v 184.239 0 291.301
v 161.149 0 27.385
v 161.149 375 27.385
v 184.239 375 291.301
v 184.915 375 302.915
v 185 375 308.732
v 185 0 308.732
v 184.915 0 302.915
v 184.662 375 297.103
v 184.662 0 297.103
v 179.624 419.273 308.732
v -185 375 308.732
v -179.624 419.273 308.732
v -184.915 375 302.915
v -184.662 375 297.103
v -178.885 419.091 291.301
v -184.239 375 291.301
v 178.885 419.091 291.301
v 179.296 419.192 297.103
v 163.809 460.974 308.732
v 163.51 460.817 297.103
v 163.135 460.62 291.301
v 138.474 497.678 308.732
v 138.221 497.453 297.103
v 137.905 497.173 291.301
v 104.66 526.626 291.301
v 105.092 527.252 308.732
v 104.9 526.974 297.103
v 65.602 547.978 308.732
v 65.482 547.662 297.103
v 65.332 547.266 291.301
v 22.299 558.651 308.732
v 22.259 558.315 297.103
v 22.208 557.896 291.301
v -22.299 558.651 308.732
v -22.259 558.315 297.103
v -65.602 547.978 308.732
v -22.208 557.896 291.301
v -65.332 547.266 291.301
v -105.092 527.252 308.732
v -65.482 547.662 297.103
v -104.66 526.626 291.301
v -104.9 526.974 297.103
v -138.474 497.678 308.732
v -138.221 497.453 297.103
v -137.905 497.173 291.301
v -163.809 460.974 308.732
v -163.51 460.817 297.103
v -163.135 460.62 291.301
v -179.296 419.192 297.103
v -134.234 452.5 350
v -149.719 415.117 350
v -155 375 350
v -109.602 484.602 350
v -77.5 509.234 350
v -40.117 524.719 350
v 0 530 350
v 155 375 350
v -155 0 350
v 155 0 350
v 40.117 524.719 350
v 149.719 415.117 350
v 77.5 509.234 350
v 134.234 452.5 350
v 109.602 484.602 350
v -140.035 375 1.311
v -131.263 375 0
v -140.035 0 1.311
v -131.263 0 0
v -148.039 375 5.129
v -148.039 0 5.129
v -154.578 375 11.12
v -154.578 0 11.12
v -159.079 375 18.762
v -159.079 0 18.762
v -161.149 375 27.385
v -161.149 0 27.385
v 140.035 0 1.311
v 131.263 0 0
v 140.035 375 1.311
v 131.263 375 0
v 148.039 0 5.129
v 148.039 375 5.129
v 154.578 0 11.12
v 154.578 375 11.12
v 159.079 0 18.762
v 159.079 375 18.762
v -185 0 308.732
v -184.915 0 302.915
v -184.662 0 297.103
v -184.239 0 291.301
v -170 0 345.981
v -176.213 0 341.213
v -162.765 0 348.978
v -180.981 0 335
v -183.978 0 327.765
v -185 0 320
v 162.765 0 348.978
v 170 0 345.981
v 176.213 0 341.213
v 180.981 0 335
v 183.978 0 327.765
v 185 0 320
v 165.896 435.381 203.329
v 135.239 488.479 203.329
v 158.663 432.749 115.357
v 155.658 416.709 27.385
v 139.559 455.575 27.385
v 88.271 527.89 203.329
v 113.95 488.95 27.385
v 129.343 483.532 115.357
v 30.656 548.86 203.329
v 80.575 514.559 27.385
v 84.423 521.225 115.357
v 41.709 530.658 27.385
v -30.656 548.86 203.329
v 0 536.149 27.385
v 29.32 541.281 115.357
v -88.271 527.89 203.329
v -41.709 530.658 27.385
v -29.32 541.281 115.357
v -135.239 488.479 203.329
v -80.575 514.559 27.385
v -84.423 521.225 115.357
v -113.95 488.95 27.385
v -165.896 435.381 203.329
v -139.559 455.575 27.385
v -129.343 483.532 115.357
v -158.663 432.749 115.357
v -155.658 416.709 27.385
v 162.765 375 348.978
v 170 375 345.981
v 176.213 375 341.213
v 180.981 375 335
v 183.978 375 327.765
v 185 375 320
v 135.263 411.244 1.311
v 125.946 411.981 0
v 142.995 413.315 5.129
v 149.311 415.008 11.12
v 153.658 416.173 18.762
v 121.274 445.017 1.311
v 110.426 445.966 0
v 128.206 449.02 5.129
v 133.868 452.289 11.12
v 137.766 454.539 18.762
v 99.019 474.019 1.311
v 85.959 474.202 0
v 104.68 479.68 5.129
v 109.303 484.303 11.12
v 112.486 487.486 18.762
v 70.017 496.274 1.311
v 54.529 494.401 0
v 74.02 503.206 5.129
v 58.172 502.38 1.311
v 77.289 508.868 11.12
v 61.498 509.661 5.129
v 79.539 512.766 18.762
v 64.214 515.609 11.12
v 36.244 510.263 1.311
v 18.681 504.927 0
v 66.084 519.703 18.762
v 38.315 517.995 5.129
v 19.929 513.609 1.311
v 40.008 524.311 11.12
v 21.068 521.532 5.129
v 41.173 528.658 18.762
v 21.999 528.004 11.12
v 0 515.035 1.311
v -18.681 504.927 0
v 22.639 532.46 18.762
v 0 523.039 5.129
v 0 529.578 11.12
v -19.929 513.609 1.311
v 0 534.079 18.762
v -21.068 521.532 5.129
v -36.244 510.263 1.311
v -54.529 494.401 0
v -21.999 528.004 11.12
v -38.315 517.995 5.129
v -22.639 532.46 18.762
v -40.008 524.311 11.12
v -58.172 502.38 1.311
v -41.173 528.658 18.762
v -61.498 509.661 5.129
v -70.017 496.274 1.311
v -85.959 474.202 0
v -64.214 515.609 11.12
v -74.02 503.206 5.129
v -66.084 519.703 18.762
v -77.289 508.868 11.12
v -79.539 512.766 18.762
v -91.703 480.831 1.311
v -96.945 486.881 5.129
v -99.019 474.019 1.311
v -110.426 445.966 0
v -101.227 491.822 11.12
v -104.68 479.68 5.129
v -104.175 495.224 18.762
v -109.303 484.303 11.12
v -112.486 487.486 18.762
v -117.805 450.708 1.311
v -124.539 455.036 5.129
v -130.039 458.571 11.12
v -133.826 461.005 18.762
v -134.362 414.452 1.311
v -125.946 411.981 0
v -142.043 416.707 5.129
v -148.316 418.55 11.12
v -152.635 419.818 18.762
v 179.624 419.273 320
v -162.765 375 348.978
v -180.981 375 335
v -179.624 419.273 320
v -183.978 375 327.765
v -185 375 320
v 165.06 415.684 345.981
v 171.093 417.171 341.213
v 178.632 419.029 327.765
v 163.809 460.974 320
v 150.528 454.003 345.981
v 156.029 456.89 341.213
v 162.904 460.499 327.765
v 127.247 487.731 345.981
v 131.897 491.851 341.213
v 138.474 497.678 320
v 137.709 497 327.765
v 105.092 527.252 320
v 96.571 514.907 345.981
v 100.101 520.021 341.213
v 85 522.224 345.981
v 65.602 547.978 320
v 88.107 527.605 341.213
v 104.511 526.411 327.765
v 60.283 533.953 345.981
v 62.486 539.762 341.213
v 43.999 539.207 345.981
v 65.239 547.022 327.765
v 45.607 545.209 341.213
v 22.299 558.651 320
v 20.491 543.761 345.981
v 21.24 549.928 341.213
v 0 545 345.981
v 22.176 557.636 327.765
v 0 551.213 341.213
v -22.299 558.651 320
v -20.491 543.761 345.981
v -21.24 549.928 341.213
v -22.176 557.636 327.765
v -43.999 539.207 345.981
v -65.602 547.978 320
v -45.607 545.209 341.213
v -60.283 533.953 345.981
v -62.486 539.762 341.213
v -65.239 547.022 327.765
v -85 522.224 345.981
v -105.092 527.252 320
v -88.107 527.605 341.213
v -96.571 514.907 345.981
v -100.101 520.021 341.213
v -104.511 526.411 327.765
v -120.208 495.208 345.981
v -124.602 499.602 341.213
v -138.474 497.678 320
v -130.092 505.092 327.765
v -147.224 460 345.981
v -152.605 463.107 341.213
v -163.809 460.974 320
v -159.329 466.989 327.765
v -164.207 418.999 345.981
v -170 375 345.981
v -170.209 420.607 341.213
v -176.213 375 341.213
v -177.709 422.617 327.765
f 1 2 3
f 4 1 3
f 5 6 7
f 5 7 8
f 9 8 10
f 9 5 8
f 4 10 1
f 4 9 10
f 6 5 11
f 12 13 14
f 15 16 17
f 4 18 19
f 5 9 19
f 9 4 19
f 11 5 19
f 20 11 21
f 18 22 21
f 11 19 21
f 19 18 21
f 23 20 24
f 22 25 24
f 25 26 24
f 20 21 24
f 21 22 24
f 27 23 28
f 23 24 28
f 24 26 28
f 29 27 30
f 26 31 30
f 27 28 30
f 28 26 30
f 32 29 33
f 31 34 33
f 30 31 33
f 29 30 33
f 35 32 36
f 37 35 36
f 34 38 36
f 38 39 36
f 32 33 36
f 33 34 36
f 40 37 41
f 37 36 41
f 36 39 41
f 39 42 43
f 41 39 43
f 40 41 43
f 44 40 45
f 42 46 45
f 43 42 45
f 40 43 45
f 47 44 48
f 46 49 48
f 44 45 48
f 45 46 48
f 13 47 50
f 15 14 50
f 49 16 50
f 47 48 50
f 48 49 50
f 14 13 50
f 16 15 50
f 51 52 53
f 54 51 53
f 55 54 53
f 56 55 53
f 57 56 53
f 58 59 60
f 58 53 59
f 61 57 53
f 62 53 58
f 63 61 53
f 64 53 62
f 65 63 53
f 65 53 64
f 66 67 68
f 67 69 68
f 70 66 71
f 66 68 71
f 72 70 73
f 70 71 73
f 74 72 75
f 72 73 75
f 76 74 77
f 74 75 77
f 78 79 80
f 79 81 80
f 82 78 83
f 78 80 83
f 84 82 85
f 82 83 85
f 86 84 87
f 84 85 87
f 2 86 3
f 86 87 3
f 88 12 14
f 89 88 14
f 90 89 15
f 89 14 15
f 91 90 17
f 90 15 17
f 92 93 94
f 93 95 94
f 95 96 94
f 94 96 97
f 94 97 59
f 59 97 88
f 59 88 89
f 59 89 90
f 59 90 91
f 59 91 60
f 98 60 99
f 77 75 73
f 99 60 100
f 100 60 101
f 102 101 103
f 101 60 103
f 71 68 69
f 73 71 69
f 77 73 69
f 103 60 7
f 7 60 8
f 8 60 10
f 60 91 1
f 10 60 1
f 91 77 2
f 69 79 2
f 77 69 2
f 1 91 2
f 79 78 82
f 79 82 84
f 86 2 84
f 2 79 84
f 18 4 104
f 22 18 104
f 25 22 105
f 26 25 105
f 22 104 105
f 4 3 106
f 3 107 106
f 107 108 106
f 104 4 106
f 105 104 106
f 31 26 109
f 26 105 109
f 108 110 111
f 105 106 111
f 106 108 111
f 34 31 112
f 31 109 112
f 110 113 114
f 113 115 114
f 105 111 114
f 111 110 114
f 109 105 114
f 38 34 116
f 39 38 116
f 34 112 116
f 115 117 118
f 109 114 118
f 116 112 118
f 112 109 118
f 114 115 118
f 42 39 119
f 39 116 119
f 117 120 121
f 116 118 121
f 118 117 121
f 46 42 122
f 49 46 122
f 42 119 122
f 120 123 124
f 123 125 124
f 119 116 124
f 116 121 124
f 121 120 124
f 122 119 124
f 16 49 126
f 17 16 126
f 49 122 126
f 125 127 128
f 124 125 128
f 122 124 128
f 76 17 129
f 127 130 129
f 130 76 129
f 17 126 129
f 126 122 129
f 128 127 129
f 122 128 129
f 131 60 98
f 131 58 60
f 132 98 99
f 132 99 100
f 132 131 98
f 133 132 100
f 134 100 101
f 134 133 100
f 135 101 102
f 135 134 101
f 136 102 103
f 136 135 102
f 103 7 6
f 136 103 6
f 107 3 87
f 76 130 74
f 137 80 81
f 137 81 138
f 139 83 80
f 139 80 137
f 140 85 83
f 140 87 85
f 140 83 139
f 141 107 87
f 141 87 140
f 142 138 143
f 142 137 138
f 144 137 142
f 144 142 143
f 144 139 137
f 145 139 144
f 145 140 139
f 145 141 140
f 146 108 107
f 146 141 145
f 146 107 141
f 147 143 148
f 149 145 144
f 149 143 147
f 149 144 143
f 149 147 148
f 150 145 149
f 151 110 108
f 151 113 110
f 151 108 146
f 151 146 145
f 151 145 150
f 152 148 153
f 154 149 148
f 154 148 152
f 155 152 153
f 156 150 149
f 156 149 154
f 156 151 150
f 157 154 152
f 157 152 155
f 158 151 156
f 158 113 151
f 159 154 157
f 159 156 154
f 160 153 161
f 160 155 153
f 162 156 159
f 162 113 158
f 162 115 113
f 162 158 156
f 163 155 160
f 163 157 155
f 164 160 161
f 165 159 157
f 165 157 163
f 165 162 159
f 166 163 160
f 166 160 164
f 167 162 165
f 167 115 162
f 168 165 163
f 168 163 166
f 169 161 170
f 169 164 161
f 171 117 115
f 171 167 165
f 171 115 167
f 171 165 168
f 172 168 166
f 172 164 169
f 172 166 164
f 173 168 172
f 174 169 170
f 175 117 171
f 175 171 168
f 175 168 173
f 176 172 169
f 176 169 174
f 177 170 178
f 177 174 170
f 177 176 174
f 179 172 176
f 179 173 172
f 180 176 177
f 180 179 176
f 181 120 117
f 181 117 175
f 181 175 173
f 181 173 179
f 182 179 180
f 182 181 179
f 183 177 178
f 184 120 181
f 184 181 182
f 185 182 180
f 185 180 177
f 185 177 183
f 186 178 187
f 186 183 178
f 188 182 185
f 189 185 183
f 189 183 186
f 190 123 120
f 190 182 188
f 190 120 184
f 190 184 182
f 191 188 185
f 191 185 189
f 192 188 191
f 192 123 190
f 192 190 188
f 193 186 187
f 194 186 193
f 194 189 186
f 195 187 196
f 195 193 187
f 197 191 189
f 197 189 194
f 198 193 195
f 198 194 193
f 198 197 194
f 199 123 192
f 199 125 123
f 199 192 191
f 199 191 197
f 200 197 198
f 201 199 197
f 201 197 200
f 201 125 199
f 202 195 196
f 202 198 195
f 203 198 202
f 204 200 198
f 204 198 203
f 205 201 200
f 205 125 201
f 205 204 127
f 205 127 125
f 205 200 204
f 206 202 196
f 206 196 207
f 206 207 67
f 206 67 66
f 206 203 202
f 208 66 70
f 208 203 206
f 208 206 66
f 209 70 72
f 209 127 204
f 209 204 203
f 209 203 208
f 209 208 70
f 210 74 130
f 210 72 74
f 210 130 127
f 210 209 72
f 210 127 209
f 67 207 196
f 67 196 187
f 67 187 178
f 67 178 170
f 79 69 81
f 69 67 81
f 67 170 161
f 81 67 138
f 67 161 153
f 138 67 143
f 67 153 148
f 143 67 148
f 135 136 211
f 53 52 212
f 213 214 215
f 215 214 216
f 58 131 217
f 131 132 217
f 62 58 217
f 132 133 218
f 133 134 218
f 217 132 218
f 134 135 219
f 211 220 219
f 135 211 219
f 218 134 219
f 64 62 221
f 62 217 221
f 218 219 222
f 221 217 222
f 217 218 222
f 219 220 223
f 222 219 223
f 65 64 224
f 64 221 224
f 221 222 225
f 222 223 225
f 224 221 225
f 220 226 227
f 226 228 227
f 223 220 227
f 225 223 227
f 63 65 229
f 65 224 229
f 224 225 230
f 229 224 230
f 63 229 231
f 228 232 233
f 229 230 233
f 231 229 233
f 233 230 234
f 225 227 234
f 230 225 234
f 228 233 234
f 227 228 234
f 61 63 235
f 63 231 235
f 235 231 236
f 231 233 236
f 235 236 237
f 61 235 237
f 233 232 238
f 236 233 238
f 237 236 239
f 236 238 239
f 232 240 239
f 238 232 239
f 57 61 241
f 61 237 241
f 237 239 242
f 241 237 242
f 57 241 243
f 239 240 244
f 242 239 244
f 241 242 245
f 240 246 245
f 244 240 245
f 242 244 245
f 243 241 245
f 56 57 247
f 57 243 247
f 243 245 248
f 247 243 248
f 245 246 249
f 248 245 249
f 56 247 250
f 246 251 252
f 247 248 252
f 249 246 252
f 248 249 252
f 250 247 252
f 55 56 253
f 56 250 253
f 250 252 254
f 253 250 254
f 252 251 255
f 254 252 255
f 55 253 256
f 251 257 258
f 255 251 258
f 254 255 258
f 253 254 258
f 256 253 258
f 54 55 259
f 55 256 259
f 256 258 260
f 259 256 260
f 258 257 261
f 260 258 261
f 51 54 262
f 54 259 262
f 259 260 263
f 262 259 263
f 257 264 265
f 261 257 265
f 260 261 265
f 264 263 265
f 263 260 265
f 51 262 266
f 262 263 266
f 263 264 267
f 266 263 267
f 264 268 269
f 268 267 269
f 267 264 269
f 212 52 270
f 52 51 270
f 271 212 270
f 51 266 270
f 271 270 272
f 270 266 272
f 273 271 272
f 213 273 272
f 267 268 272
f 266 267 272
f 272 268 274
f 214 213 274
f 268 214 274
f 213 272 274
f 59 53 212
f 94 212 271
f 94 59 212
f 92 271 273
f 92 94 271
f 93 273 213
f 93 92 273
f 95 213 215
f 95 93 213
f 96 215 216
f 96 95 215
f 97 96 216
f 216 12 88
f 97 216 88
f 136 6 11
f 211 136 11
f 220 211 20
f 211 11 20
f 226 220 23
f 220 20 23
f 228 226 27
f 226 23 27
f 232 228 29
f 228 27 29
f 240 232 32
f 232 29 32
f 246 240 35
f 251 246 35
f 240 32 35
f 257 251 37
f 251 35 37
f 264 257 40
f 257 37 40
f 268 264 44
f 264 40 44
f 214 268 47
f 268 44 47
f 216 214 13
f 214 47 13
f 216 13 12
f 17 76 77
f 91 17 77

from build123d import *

# Parameters (mm, degrees)
F1_DEPTH    = 350
F2_SIZE2    = 26.2465990578
F2_SIZE     = 300
F3_T1_DEPTH = 396.8304714543
F3_T4_ANGLE = 180
F4_R        = 30


# Not quite as in the source:
# - a fillet or chamfer that OpenCascade refuses, or shapes differently, is made with other operations: its cross-section is extruded or revolved along the edge and cut away or added


with BuildPart() as f1:
    # F0 (on Top) → F1 (new body)
    with BuildSketch(Plane.XY):
        with BuildLine():
            Line((-185, 375), (-185, 0))
            Line((-185, 0), (185, 0))
            Line((185, 0), (185, 375))
            ThreePointArc((185, 375), (130.8147545195, 505.8147545195), (0, 560))
            ThreePointArc((0, 560), (-130.8147545195, 505.8147545195), (-185, 375))
        make_face()
    extrude(amount=F1_DEPTH)

    # F2
    f2_edges = [f1.edges().sort_by_distance(p)[0] for p in [
        (185, 187.5, 0),
        (0, 560, 0),
        (-185, 187.5, 0),
    ]]
    chamfer(f2_edges, length=F2_SIZE, length2=F2_SIZE2)

    # F3: fillet of radius 200 on 3 edges, made by hand

    # F3_s2 → F3_t1 (cut)
    with BuildSketch(Plane.XZ.offset(-375)):
        with BuildLine():
            ThreePointArc((-185, 308.7321885817), (-184.8096443164, 300.0083111086), (-184.2389396183, 291.3010400322))
            Line((-184.2389396183, 291.3010400322), (-185, 300))
            Line((-185, 300), (-185, 308.7321885817))
        make_face()
        with BuildLine():
            ThreePointArc((185, 308.7321885817), (184.8096443164, 300.0083111086), (184.2389396183, 291.3010400322))
            Line((184.2389396183, 291.3010400322), (185, 300))
            Line((185, 300), (185, 308.7321885817))
        make_face()
    extrude(amount=F3_T1_DEPTH, mode=Mode.SUBTRACT)

    # F3_s3 → F3_t4 (revolve, cut)
    with BuildSketch(Plane.XZ.offset(-375)):
        with BuildLine():
            ThreePointArc((185, 308.7321885817), (184.8096443164, 300.0083111086), (184.2389396183, 291.3010400322))
            Line((184.2389396183, 291.3010400322), (185, 300))
            Line((185, 300), (185, 308.7321885817))
        make_face()
    revolve(axis=Axis((0, 375, 300), (0, 0, 1)), revolution_arc=F3_T4_ANGLE, mode=Mode.SUBTRACT)

    # F4
    f4_edges = [f1.edges().sort_by_distance(p)[0] for p in [
        (158.753401, 187.5, 0),
        (0, 533.753401, 0),
        (-158.753401, 187.5, 0),
        (185, 187.5, 350),
        (0, 560, 350),
        (-185, 187.5, 350),
    ]]
    fillet(f4_edges, radius=F4_R)


solid = f1.part
